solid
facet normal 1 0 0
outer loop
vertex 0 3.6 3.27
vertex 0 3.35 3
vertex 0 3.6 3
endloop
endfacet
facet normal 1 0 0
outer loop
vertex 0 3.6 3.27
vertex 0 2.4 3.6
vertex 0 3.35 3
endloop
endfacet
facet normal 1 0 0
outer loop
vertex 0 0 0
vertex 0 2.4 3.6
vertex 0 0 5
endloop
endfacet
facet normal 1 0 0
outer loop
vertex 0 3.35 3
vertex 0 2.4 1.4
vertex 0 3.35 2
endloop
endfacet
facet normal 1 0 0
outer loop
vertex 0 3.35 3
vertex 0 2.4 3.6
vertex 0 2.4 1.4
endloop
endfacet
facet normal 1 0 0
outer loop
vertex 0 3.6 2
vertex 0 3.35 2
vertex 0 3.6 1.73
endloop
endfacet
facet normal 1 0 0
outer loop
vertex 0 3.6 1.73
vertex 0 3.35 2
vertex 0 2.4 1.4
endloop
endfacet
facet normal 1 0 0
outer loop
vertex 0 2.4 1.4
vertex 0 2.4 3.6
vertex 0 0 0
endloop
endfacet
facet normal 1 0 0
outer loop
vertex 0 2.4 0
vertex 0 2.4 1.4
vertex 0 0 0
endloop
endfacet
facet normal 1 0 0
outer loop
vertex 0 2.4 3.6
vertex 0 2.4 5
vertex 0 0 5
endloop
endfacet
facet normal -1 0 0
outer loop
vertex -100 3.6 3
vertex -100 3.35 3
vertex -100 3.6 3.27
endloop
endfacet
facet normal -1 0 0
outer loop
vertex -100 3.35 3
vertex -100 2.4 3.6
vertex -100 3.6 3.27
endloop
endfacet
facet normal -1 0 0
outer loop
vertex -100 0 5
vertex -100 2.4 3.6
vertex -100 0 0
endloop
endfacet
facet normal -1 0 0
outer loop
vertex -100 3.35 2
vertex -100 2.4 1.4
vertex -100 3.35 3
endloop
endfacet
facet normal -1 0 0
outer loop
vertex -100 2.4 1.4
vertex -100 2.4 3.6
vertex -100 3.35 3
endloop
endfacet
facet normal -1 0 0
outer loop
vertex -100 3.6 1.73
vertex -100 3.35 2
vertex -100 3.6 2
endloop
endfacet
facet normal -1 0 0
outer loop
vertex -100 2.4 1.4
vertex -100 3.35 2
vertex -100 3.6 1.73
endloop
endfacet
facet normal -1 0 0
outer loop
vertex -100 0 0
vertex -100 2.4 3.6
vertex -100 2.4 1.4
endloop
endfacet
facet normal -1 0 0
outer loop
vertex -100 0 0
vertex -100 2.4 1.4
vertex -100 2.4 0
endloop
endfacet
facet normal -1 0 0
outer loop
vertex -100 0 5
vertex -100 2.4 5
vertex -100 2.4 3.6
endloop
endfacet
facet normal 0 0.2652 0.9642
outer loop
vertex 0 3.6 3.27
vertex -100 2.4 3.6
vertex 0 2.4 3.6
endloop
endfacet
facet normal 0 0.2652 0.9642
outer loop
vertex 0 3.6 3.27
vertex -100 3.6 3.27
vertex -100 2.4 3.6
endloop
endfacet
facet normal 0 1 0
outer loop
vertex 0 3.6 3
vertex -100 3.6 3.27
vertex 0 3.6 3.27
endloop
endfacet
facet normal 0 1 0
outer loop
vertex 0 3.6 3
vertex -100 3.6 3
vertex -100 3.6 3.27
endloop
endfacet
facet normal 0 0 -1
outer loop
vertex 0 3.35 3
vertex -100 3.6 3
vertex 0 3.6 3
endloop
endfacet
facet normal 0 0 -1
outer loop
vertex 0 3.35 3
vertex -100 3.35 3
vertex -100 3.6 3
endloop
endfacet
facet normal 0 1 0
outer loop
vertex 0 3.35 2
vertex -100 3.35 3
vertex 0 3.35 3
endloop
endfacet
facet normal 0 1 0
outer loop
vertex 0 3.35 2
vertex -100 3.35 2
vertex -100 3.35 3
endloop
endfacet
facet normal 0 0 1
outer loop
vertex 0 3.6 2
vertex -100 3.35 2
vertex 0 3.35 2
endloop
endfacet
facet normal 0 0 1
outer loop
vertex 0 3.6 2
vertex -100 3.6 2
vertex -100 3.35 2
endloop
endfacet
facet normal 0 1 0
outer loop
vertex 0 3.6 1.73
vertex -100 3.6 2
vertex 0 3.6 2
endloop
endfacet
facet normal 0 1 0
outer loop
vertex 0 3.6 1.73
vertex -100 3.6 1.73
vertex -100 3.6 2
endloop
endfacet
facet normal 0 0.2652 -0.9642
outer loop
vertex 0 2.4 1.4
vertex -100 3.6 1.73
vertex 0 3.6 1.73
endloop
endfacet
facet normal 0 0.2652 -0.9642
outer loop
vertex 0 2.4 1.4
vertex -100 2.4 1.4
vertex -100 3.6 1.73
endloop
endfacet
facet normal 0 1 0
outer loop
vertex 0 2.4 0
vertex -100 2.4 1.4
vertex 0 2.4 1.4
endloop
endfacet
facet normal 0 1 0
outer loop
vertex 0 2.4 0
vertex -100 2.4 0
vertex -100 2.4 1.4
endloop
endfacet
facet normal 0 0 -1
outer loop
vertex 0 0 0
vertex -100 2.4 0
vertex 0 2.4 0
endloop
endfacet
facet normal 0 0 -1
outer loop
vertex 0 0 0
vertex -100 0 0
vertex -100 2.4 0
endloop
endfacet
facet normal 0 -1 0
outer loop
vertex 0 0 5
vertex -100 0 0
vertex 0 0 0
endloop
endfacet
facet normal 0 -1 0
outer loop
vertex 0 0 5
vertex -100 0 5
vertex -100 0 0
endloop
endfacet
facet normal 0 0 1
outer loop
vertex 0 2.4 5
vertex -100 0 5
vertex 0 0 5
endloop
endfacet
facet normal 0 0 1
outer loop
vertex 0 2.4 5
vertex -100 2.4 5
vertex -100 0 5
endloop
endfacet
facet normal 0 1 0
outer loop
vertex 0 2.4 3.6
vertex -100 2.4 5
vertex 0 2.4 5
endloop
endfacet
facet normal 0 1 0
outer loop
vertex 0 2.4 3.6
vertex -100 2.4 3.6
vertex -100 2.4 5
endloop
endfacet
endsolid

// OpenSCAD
$fn = 96;

// Miniature linear guide rail (mm)
rail_w = 5.0;
rail_h = 3.6;
rail_l = 100.0;

// Profile parameters (kept within overall envelope)
base_h   = 2.4;                 // base thickness
top_h    = rail_h - base_h;     // remaining height for top features

// Side grooves (visual "track" features)
groove_w = 0.9;
groove_d = 0.55;

// Central raised ridge (rail crown)
ridge_w  = 2.2;
ridge_h  = top_h;

// Small overlap to guarantee watertight unions/differences
eps = 0.02;

module rail_solid() {
    // Build as a true 3D solid by extruding a 2D cross-section along length (Y).
    // This avoids accidental "sheet/edge" geometry and guarantees a connected manifold.
    linear_extrude(height=rail_l, center=false, convexity=10)
        difference() {
            // Outer envelope: exact 5.0mm (X) by 3.6mm (Z)
            square([rail_w, rail_h], center=false);

            // Two side grooves cut into the top surface
            for (sx = [0, 1]) {
                translate([
                    (sx == 0) ? 0 : (rail_w - groove_w),
                    rail_h - groove_d
                ])
                    square([groove_w, groove_d + eps], center=false);
            }

            // Shallow central relief channel (kept shallower than ridge height)
            relief_w = 1.0;
            relief_d = 0.25;
            translate([rail_w/2 - relief_w/2, rail_h - relief_d])
                square([relief_w, relief_d + eps], center=false);

            // Carve the "outside" of the ridge so the remaining material forms a raised crown.
            // Ridge sits on top of base_h and rises by ridge_h, staying within rail_h.
            translate([0, base_h])
                difference() {
                    // Only affect the upper region
                    square([rail_w, ridge_h + eps], center=false);

                    // Keep the ridge polygon; remove everything else in this upper region
                    translate([rail_w/2, 0])
                        polygon(points=[
                            [-ridge_w/2, 0],
                            [ ridge_w/2, 0],
                            [ ridge_w*0.35, ridge_h],
                            [-ridge_w*0.35, ridge_h]
                        ]);
                }
        }
}

// Orient length along X for clearer orthographic verification (100mm long)
rotate([0, -90, 0])
    rail_solid();
